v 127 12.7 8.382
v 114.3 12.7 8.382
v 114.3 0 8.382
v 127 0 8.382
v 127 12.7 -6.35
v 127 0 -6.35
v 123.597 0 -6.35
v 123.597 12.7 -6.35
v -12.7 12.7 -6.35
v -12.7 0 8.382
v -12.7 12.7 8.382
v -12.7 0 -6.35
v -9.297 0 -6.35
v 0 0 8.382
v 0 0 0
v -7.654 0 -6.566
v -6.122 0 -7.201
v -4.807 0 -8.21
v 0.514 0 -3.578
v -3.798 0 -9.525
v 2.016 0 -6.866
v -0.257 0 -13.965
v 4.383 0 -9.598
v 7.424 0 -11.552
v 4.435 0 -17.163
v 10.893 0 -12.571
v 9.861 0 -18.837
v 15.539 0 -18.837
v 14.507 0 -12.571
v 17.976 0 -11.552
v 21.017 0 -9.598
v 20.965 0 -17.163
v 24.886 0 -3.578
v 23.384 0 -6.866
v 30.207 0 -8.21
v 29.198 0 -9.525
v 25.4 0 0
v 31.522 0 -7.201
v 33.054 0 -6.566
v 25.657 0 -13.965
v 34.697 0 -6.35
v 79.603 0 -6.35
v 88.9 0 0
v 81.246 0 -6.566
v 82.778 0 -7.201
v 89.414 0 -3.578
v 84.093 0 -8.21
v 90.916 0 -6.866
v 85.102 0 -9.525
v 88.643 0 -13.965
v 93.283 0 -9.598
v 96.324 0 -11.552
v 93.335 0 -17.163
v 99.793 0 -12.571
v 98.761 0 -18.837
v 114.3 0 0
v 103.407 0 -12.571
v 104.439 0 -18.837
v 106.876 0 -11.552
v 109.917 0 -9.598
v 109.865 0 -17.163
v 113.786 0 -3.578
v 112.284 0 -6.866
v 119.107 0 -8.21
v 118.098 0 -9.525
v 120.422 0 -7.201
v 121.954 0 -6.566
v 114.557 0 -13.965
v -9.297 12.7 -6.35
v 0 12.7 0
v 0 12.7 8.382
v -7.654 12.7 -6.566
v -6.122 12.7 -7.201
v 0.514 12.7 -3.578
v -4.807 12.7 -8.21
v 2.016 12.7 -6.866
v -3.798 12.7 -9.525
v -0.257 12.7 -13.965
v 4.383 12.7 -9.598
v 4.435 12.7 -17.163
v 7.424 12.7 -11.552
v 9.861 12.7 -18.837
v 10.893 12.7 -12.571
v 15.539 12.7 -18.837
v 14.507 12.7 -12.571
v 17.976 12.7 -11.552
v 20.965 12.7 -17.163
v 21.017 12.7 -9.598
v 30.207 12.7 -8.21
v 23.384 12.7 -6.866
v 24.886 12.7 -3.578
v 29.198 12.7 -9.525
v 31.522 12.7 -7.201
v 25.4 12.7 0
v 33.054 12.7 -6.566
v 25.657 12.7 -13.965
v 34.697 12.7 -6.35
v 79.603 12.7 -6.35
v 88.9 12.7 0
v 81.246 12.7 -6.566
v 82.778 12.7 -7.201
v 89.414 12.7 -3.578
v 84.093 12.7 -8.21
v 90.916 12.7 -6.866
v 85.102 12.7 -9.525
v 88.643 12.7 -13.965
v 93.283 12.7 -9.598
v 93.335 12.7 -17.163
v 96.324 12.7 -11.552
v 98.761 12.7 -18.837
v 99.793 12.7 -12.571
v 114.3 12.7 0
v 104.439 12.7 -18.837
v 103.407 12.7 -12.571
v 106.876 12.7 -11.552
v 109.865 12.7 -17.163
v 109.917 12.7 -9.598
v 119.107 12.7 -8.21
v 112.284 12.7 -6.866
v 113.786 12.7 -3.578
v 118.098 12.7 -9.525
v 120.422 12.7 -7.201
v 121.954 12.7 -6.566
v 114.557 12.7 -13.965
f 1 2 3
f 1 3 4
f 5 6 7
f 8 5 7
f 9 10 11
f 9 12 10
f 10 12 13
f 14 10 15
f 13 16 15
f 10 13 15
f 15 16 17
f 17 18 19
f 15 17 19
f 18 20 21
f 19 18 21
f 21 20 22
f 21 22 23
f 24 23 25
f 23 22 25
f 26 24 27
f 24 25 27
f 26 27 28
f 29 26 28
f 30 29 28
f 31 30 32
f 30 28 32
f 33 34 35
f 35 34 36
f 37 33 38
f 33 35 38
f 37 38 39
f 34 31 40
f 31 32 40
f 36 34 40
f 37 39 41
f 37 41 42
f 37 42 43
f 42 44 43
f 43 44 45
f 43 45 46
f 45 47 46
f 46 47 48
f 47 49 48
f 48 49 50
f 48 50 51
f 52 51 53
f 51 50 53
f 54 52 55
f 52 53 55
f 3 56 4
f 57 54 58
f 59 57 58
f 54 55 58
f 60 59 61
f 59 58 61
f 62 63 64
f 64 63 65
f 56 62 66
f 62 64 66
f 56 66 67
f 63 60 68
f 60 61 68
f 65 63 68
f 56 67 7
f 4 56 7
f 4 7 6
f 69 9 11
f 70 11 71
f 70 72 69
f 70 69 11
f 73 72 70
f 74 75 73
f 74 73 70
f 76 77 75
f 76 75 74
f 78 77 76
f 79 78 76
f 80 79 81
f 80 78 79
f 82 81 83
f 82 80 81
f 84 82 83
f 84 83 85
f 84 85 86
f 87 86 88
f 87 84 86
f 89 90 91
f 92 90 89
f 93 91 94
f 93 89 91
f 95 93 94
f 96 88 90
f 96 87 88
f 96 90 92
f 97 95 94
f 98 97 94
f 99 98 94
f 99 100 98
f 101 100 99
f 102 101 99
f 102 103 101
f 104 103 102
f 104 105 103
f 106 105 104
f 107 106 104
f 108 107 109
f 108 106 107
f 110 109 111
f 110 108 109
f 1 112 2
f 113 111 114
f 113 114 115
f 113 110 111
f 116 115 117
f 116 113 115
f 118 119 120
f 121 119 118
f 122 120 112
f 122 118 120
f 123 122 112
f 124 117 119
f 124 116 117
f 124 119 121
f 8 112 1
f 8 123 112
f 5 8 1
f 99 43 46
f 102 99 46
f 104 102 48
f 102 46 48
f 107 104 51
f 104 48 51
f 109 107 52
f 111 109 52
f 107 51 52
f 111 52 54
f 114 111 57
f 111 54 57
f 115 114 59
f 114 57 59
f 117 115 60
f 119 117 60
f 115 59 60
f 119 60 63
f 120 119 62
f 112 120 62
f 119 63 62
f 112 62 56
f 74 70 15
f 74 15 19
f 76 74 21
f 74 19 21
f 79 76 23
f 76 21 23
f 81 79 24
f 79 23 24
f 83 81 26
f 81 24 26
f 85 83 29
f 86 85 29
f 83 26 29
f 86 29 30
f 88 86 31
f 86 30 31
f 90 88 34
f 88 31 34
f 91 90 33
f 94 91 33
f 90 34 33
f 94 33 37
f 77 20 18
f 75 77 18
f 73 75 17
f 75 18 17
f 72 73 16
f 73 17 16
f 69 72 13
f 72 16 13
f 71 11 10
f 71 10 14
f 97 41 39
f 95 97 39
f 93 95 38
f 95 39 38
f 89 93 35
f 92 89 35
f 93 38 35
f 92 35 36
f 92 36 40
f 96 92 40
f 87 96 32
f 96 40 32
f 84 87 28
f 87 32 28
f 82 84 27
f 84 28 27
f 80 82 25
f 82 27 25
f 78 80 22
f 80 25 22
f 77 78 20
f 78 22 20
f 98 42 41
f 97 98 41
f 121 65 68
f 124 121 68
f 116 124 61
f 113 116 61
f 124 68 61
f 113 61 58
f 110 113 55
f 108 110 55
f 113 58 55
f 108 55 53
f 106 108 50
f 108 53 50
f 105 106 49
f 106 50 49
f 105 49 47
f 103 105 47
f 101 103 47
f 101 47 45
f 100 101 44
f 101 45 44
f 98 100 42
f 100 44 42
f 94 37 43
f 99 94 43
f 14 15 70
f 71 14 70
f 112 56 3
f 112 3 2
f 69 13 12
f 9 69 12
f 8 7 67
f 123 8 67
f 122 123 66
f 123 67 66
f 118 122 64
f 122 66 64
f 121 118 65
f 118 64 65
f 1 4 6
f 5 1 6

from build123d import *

# Parameters (mm, degrees)
BOSS_EXTRUDE1_DEPTH = 12.7
SKETCH2_W           = 12.7
SKETCH2_H           = 12.7
BOSS_EXTRUDE2_DEPTH = 8.382


with BuildPart() as part:
    # Sketch1 → Boss-Extrude1 (new body)
    with BuildSketch(Plane(origin=(0, 0, 0), x_dir=(1, 0, 0), z_dir=(0, 1, 0))):
        with BuildLine():
            Line((25.4, 0), (88.9, 0))
            ThreePointArc((88.9, 0), (101.6, 12.7), (114.3, 0))
            Line((114.3, 0), (127, 0))
            Line((127, 0), (127, 6.35))
            Line((127, 6.35), (123.597045256, 6.35))
            ThreePointArc((123.597045256, 6.35), (120.422045256, 7.200738686), (118.097783942, 9.525))
            ThreePointArc((118.097783942, 9.525), (101.6, 19.05), (85.102216058, 9.525))
            ThreePointArc((85.102216058, 9.525), (82.777954744, 7.200738686), (79.602954744, 6.35))
            Line((79.602954744, 6.35), (34.697045256, 6.35))
            ThreePointArc((34.697045256, 6.35), (31.522045256, 7.200738686), (29.197783942, 9.525))
            ThreePointArc((29.197783942, 9.525), (12.7, 19.05), (-3.797783942, 9.525))
            ThreePointArc((-3.797783942, 9.525), (-6.122045256, 7.200738686), (-9.297045256, 6.35))
            Line((-9.297045256, 6.35), (-12.7, 6.35))
            Line((-12.7, 6.35), (-12.7, 0))
            Line((-12.7, 0), (0, 0))
            ThreePointArc((0, 0), (12.7, 12.7), (25.4, 0))
        make_face()
    extrude(amount=BOSS_EXTRUDE1_DEPTH)

    # Sketch2 → Boss-Extrude2 (add)
    with BuildSketch(Plane.XY):
        with Locations((-6.35, 6.35)):
            Rectangle(SKETCH2_W, SKETCH2_H)
        with Locations((120.65, 6.35)):
            Rectangle(SKETCH2_W, SKETCH2_H)
    extrude(amount=BOSS_EXTRUDE2_DEPTH)


solid = part.part
